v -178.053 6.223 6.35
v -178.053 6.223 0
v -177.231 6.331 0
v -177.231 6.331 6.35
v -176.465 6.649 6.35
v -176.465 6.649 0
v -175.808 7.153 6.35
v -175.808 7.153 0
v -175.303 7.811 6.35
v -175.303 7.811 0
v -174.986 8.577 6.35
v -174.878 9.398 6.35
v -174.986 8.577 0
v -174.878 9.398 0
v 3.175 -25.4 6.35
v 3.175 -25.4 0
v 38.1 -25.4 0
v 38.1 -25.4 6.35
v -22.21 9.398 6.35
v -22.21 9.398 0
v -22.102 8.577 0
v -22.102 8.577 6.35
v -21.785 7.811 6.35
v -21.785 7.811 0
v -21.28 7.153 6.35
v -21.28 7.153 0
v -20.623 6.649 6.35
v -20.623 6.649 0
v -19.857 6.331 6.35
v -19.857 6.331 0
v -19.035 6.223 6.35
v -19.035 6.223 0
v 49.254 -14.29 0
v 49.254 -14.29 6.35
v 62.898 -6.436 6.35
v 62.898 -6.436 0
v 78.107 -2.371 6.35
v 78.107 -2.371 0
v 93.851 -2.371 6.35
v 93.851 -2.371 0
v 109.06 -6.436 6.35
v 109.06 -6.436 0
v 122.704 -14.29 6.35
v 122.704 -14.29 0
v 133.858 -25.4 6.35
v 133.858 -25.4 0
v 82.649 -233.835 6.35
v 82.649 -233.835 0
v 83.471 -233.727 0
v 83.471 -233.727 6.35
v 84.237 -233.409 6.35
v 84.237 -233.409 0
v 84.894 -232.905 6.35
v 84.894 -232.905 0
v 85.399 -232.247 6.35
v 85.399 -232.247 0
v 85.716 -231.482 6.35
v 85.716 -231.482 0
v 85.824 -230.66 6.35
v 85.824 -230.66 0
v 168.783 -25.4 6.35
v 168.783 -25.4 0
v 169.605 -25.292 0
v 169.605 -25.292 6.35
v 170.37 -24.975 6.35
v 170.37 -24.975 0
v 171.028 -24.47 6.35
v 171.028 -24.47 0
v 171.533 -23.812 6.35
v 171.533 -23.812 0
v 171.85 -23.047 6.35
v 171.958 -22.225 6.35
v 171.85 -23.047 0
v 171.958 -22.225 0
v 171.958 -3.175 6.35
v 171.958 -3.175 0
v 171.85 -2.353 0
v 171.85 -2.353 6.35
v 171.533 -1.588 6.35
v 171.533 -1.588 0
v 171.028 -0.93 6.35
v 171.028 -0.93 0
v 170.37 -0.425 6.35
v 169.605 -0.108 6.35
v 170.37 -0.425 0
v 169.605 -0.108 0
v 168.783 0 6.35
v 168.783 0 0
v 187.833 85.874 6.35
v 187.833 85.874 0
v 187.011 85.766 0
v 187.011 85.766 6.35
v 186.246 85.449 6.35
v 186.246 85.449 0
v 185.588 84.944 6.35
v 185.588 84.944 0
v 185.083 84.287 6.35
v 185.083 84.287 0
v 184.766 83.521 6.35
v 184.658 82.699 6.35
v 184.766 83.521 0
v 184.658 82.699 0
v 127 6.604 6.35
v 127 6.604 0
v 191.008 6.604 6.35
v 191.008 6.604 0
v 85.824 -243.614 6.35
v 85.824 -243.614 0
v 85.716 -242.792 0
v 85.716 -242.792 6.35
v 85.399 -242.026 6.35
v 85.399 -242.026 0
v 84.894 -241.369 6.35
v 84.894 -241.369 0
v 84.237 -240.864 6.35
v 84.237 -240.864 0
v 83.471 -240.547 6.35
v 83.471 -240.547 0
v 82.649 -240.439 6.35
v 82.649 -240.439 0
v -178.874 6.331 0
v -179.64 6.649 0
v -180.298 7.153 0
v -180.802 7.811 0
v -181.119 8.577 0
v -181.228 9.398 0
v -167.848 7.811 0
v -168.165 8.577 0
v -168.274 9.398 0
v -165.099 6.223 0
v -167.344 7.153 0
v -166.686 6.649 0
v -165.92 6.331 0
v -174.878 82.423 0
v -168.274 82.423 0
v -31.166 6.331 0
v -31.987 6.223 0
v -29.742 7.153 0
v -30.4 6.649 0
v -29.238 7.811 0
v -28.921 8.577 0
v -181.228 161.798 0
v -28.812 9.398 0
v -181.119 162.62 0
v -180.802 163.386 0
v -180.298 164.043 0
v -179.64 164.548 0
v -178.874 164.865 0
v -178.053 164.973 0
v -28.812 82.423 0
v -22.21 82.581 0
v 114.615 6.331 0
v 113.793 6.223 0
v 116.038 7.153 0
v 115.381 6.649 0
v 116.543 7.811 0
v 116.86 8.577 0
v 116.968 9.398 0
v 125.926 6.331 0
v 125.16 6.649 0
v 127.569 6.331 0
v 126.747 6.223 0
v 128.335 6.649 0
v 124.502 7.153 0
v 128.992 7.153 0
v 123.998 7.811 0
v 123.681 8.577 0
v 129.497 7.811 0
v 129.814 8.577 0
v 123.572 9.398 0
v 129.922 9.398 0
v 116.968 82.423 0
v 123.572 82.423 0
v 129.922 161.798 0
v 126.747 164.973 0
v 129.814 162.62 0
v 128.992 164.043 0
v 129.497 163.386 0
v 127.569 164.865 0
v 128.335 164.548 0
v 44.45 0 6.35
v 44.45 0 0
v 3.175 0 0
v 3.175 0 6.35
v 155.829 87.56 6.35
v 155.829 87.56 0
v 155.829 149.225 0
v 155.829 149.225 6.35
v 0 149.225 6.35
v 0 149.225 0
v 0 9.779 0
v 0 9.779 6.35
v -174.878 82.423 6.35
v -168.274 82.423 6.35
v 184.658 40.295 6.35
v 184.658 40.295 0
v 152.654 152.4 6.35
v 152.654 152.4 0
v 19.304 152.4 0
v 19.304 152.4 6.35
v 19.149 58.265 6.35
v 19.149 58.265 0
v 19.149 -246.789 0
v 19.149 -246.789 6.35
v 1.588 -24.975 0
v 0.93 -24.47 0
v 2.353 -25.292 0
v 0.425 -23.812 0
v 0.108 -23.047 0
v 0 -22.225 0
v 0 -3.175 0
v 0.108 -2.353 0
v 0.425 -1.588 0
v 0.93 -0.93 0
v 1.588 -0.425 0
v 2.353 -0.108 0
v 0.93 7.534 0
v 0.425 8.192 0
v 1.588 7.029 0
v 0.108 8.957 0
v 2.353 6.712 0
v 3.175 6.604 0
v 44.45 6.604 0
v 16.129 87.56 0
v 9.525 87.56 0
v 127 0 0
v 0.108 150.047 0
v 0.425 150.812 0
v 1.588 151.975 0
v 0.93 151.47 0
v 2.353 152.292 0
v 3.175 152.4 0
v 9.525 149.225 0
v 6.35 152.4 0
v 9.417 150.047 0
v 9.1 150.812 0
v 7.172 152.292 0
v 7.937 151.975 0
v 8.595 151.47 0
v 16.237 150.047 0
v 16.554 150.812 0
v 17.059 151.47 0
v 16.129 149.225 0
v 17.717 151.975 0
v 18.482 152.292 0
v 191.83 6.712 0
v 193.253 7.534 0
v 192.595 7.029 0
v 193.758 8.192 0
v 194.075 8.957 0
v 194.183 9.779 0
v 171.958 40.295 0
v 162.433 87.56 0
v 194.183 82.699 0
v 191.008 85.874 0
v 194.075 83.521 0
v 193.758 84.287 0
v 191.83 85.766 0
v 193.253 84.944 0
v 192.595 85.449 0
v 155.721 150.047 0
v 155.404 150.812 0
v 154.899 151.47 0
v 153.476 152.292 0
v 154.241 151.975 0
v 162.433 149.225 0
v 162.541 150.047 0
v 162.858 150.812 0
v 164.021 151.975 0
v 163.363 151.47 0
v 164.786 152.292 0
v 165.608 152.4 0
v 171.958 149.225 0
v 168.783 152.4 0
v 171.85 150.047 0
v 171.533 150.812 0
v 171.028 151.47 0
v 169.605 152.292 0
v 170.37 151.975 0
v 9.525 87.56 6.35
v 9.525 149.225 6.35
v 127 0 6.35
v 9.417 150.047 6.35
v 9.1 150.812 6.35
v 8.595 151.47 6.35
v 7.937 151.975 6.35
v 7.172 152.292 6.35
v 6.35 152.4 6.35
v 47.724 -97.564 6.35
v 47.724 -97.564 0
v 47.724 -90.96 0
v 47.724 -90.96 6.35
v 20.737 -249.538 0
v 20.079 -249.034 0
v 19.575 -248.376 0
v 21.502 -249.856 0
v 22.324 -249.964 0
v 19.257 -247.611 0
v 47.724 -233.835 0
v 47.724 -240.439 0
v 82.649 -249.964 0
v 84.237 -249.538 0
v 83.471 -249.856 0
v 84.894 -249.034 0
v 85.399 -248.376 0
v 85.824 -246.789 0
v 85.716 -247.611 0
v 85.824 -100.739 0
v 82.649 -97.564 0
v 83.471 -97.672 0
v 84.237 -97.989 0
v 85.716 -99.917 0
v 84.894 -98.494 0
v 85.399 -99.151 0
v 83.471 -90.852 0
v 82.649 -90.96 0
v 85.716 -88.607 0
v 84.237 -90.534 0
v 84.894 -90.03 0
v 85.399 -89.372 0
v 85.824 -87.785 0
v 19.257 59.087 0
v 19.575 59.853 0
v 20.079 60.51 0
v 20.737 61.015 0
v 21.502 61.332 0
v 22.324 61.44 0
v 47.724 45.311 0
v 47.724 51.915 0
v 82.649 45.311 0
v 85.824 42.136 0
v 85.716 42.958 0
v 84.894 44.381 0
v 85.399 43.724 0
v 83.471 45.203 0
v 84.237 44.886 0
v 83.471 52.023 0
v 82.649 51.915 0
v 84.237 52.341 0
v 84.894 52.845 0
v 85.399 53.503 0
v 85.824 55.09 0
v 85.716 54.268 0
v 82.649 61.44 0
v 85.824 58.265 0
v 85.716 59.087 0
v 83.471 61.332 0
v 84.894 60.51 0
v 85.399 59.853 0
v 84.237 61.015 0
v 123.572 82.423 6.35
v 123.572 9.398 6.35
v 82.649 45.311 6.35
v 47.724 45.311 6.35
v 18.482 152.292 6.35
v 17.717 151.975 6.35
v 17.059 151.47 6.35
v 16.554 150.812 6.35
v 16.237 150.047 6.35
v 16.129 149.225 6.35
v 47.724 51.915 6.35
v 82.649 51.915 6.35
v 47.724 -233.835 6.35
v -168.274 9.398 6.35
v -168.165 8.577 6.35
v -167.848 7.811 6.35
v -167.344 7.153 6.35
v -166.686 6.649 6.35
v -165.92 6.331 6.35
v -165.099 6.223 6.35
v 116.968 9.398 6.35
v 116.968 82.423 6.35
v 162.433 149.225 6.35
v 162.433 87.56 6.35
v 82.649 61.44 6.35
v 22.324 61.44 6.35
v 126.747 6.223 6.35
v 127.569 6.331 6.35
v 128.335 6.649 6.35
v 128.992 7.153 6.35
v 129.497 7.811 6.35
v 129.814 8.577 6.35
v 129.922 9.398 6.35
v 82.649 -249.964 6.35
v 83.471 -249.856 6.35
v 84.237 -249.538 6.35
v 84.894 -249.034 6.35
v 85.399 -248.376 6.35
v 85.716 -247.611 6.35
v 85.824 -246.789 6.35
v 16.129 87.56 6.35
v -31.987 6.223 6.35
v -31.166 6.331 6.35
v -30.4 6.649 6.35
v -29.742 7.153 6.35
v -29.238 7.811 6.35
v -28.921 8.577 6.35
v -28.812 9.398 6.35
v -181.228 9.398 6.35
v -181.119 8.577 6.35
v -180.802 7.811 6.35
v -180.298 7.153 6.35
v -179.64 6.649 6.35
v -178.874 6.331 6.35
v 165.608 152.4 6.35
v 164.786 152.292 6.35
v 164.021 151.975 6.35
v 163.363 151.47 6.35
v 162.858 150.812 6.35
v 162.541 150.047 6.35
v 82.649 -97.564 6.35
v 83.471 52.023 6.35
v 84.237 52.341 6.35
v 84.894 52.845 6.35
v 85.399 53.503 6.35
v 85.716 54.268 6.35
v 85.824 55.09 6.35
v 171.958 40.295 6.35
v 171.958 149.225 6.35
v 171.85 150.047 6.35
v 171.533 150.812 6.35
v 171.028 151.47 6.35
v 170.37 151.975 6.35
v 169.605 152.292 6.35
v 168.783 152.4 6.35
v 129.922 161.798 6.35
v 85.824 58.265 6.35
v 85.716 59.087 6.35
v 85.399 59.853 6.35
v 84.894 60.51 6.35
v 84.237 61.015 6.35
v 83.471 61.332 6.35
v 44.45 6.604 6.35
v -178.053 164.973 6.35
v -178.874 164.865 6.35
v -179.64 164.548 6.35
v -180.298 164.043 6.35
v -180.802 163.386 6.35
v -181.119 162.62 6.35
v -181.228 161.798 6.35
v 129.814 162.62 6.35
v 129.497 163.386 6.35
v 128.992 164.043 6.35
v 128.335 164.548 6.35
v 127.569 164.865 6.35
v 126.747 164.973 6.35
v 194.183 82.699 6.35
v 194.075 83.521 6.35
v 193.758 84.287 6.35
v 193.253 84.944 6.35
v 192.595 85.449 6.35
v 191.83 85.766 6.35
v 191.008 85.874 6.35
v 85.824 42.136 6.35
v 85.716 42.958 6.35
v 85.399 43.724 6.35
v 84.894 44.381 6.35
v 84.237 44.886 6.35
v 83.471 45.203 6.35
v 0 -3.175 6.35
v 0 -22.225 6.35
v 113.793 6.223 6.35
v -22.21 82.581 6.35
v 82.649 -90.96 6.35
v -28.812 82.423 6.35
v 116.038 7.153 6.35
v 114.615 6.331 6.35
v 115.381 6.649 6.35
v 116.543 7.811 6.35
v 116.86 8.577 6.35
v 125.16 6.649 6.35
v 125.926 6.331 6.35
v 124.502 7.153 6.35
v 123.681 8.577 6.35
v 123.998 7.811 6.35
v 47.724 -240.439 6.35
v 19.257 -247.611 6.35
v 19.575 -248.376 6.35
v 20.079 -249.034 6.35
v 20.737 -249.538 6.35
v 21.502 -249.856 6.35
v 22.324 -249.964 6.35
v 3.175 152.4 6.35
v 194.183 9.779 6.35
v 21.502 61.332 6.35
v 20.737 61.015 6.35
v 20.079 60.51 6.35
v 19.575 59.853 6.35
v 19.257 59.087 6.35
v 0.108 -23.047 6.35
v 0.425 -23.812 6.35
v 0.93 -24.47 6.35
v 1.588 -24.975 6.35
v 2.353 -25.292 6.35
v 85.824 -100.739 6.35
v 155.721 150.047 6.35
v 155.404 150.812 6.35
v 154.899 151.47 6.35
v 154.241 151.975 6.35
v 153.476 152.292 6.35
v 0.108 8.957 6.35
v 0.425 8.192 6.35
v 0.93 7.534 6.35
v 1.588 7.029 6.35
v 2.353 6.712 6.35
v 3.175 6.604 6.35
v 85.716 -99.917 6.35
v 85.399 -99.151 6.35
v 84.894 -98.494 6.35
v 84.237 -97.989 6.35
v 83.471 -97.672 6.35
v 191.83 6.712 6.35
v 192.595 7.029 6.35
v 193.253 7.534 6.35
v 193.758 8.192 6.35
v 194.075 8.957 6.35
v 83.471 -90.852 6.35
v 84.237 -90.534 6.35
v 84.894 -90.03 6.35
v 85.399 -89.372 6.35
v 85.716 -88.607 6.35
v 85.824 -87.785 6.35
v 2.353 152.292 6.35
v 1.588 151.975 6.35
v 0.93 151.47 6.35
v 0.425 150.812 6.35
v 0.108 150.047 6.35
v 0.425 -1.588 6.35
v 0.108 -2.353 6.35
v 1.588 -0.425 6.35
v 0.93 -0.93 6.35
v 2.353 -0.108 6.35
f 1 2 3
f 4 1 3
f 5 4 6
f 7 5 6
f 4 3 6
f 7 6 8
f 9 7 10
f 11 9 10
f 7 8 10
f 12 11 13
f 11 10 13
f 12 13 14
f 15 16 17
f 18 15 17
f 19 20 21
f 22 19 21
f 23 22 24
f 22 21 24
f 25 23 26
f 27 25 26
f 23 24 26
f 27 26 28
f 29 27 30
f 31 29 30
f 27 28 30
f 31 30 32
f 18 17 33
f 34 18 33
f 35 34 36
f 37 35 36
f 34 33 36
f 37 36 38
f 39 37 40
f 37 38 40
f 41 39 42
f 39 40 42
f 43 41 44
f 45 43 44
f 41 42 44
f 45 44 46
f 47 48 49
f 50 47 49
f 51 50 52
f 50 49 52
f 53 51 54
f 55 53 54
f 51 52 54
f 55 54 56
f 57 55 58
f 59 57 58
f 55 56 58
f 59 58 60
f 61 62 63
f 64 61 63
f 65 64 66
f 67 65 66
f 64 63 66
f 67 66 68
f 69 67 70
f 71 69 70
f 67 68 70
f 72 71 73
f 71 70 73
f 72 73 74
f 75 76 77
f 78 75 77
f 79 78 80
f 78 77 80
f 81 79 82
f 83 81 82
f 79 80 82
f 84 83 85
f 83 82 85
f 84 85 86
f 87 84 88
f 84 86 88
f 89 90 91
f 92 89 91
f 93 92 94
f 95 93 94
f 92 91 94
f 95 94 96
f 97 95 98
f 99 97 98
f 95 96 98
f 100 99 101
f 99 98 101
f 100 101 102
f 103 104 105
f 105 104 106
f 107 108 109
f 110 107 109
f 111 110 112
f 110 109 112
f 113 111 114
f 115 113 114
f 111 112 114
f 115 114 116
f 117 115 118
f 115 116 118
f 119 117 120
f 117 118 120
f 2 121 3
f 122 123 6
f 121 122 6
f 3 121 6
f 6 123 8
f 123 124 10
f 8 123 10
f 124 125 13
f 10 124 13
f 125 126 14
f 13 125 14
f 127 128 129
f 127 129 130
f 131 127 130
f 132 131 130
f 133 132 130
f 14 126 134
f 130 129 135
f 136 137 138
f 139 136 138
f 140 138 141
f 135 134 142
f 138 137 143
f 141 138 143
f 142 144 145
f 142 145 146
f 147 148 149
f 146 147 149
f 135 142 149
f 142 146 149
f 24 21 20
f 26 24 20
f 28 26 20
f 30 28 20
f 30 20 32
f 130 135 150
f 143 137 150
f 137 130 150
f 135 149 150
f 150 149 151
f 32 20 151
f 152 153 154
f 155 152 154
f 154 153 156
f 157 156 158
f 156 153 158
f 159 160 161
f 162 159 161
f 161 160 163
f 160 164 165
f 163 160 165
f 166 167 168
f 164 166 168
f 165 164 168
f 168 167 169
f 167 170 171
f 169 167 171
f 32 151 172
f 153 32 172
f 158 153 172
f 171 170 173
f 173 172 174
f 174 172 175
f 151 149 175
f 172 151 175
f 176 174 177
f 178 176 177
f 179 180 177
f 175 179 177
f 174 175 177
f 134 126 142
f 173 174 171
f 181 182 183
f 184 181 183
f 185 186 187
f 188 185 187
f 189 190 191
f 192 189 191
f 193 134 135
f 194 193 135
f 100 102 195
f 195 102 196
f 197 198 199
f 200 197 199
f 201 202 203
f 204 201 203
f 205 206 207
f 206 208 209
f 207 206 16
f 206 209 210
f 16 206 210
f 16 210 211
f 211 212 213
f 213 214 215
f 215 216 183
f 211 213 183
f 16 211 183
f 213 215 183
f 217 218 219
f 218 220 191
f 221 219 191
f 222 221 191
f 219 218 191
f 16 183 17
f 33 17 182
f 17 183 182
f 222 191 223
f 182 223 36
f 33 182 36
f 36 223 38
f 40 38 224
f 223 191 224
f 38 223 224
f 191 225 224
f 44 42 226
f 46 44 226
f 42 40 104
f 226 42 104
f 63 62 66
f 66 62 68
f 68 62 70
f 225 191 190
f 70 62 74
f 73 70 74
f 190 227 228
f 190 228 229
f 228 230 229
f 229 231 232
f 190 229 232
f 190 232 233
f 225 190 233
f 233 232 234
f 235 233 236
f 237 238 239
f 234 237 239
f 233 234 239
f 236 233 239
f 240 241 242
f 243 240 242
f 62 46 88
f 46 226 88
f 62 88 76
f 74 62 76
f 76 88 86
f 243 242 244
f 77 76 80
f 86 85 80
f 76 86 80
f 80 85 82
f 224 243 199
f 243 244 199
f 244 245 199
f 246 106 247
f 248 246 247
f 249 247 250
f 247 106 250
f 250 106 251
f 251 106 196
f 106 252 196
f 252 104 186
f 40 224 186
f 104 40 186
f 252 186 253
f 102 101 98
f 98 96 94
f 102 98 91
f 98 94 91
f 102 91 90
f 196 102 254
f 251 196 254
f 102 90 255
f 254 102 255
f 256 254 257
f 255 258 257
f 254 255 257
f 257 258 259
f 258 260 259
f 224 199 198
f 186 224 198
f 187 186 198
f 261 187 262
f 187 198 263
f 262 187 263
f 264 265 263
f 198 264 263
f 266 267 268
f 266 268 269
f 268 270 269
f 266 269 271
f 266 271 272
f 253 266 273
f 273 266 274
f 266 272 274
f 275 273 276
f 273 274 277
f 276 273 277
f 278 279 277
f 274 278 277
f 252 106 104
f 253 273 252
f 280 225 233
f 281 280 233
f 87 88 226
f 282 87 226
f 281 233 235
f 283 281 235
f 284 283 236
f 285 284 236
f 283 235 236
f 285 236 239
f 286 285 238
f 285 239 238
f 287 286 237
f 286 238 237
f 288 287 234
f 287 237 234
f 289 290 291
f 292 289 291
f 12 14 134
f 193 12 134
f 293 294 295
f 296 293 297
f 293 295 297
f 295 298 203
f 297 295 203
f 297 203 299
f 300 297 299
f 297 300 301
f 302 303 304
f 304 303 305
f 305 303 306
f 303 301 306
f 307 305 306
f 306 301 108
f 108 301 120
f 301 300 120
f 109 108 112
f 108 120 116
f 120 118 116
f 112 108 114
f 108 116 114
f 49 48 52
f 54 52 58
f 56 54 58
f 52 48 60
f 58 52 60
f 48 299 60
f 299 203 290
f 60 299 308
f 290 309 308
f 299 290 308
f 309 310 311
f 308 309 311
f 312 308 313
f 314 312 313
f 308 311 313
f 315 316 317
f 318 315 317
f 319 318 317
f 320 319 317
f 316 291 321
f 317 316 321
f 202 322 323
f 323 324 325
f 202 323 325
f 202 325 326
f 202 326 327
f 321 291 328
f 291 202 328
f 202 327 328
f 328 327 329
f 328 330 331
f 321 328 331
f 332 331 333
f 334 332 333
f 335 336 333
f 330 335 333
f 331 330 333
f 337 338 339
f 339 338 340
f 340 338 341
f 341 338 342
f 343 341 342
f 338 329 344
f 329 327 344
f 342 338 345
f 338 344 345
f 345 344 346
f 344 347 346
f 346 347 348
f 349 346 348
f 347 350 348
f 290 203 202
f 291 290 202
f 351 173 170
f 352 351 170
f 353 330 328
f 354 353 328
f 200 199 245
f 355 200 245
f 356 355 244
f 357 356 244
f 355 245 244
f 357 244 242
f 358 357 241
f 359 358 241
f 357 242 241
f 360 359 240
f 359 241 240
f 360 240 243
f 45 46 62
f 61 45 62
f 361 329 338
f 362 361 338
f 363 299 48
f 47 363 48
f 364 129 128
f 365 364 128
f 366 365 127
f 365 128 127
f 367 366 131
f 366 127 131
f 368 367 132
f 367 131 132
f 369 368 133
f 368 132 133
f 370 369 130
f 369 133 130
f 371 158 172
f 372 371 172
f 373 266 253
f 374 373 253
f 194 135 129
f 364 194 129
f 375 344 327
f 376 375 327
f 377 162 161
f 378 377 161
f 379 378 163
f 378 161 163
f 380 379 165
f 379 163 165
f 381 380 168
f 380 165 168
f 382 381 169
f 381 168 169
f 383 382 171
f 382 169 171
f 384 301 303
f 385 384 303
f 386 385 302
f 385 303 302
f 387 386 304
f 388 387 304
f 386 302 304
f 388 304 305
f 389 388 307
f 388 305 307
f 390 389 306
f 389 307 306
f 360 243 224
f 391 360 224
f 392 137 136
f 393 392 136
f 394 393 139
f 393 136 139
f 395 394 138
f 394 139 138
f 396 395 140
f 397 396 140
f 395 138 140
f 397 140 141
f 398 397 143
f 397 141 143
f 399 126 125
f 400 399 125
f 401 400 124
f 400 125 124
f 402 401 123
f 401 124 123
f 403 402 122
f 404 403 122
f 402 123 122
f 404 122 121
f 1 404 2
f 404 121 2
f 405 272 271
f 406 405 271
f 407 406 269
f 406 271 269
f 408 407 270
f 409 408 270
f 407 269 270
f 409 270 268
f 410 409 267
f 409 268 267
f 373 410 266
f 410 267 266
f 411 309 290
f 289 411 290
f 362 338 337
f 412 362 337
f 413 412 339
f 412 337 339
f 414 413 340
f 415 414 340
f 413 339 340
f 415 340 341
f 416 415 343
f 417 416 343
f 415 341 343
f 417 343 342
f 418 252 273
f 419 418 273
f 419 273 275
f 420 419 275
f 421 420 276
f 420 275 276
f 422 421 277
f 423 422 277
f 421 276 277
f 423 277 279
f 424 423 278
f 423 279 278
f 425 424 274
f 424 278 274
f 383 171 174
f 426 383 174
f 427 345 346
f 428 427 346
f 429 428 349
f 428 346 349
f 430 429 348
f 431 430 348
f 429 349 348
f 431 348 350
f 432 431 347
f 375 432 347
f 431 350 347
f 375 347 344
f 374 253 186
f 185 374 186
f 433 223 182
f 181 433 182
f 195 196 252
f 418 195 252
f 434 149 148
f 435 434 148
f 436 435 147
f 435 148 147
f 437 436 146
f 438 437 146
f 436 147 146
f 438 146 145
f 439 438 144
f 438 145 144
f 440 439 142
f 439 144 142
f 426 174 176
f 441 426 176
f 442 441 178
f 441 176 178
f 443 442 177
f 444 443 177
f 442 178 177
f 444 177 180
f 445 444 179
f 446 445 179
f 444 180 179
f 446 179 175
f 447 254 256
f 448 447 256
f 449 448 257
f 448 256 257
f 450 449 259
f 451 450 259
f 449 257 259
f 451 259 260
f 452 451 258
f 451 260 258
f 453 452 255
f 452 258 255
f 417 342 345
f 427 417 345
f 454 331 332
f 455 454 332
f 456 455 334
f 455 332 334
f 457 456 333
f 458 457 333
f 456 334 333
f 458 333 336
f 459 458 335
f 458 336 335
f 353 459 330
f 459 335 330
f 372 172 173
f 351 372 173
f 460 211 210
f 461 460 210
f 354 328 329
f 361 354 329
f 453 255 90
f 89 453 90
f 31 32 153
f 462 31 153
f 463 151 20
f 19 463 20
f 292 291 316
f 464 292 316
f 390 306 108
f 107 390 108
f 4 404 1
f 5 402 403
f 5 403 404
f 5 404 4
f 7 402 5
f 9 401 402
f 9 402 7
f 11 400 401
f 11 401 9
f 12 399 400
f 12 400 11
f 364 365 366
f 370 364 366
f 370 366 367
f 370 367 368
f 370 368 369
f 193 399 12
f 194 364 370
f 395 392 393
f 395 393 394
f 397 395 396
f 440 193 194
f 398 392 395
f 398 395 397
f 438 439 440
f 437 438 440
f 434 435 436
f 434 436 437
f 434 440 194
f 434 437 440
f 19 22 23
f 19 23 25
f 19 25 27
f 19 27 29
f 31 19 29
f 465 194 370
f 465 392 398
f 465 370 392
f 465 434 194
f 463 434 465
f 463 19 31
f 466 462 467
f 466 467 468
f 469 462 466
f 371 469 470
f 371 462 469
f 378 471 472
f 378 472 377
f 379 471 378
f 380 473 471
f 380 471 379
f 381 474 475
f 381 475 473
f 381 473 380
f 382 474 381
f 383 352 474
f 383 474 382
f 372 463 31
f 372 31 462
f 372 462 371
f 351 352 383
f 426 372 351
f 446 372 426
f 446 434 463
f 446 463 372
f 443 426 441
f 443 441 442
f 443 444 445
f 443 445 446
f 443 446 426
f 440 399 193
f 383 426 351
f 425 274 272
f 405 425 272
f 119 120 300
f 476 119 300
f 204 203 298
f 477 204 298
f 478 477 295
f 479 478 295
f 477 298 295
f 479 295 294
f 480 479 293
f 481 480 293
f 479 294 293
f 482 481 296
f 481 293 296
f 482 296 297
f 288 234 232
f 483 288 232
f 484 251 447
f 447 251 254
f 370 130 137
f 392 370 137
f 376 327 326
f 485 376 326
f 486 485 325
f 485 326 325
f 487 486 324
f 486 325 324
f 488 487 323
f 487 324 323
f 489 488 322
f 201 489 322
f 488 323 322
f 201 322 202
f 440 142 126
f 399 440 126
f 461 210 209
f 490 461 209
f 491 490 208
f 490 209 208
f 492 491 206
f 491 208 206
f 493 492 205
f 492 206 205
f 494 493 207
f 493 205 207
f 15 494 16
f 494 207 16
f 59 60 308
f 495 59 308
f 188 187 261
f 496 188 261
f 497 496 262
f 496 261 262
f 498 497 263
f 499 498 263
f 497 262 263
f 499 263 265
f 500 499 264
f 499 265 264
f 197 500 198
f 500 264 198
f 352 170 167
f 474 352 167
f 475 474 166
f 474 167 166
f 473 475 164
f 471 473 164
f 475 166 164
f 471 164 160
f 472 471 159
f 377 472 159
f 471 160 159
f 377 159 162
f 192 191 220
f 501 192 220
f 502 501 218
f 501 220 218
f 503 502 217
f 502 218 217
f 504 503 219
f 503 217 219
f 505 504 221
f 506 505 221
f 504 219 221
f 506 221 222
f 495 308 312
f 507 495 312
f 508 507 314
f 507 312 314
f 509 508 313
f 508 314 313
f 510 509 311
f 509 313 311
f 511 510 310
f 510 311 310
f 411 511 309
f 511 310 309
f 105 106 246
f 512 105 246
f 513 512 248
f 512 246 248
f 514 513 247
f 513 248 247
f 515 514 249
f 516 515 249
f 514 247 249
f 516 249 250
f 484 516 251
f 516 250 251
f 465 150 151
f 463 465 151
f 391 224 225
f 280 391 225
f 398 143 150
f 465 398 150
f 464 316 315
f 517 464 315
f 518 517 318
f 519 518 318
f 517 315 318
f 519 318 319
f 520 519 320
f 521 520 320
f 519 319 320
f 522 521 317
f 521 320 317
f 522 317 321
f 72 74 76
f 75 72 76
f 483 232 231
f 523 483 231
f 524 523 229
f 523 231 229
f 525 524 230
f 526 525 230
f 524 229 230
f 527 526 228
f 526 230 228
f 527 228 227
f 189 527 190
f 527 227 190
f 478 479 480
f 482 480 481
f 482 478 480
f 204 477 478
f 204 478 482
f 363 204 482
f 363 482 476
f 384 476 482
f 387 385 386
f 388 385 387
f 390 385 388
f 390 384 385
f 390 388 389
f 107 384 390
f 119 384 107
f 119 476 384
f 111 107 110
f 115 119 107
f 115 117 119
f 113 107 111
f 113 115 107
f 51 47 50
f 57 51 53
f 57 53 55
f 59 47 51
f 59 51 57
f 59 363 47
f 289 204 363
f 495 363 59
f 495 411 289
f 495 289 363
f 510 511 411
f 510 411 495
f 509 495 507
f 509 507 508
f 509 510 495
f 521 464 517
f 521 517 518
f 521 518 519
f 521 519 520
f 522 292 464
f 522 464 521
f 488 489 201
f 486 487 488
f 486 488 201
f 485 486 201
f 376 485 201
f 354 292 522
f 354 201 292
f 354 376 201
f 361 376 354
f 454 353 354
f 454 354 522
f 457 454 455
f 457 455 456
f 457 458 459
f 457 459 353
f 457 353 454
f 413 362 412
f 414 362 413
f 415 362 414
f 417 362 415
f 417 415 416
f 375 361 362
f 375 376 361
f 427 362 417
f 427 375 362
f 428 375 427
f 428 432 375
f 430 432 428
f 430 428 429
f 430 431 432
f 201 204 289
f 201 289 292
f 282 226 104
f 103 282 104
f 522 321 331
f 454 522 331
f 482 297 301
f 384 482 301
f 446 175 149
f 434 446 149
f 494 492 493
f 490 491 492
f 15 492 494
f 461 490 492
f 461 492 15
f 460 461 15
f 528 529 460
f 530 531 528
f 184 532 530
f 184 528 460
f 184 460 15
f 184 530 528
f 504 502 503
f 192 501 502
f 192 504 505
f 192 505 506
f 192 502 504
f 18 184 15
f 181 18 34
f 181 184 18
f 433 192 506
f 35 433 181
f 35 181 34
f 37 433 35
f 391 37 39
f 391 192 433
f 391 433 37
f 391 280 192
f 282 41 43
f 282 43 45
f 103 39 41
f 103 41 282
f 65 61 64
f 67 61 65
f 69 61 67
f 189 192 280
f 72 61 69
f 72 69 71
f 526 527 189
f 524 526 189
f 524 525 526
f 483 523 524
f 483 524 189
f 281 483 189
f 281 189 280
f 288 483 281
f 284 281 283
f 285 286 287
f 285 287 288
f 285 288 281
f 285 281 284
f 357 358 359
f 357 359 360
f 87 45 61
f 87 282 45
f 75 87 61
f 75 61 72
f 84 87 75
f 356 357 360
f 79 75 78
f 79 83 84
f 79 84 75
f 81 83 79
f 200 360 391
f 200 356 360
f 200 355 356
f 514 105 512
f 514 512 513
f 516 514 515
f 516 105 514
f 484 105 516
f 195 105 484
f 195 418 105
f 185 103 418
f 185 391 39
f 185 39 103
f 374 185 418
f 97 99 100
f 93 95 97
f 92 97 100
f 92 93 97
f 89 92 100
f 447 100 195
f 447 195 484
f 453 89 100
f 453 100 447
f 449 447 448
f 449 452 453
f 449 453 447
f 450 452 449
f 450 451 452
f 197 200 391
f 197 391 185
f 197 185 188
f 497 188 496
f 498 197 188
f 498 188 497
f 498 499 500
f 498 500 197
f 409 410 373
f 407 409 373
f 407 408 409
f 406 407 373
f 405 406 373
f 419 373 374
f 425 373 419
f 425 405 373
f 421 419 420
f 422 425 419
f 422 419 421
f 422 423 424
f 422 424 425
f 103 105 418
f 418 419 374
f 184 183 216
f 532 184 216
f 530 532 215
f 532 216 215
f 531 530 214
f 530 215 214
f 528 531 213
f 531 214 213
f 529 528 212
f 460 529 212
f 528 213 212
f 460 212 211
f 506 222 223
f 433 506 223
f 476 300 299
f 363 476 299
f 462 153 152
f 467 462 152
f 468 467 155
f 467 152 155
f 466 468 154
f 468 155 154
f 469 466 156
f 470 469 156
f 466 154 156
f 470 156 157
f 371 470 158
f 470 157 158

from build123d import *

# Parameters (mm, degrees)
F3_DEPTH = 6.35
F4_DEPTH = 6.35
F5_DEPTH = 6.35
F6_DEPTH = 6.35


with BuildPart() as f3:
    # F1 (on Top) → F3 (new body)
    with BuildSketch(Plane.XY):
        with BuildLine():
            Line((82.649146, 61.440174), (22.324146, 61.440174))
            ThreePointArc((22.324146, 61.440174), (20.079082, 60.510238), (19.149146, 58.265174))
            Line((19.149146, 58.265174), (19.149146, -246.788826))
            ThreePointArc((19.149146, -246.788826), (20.079082, -249.03389), (22.324146, -249.963826))
            Line((22.324146, -249.963826), (82.649146, -249.963826))
            ThreePointArc((82.649146, -249.963826), (84.89421, -249.03389), (85.824146, -246.788826))
            Line((85.824146, -246.788826), (85.824146, -243.613826))
            ThreePointArc((85.824146, -243.613826), (84.89421, -241.368762), (82.649146, -240.438826))
            Line((82.649146, -240.438826), (47.724146, -240.438826))
            Line((47.724146, -240.438826), (47.724146, -233.834826))
            Line((47.724146, -233.834826), (82.649146, -233.834826))
            ThreePointArc((82.649146, -233.834826), (84.89421, -232.90489), (85.824146, -230.659826))
            Line((85.824146, -230.659826), (85.824146, -100.738826))
            ThreePointArc((85.824146, -100.738826), (84.89421, -98.493762), (82.649146, -97.563826))
            Line((82.649146, -97.563826), (47.724146, -97.563826))
            Line((47.724146, -97.563826), (47.724146, -90.959826))
            Line((47.724146, -90.959826), (82.649146, -90.959826))
            ThreePointArc((82.649146, -90.959826), (84.89421, -90.02989), (85.824146, -87.784826))
            Line((85.824146, -87.784826), (85.824146, 42.136174))
            ThreePointArc((85.824146, 42.136174), (84.89421, 44.381238), (82.649146, 45.311174))
            Line((82.649146, 45.311174), (47.724146, 45.311174))
            Line((47.724146, 45.311174), (47.724146, 51.915174))
            Line((47.724146, 51.915174), (82.649146, 51.915174))
            ThreePointArc((82.649146, 51.915174), (84.89421, 52.84511), (85.824146, 55.090174))
            Line((85.824146, 55.090174), (85.824146, 58.265174))
            ThreePointArc((85.824146, 58.265174), (84.89421, 60.510238), (82.649146, 61.440174))
        make_face()
    extrude(amount=F3_DEPTH)

    # F1 (on Top) → F4 (join)
    with BuildSketch(Plane.XY):
        with BuildLine():
            Line((82.649146, 61.440174), (22.324146, 61.440174))
            ThreePointArc((22.324146, 61.440174), (20.079082, 60.510238), (19.149146, 58.265174))
            Line((19.149146, 58.265174), (19.149146, -246.788826))
            ThreePointArc((19.149146, -246.788826), (20.079082, -249.03389), (22.324146, -249.963826))
            Line((22.324146, -249.963826), (82.649146, -249.963826))
            ThreePointArc((82.649146, -249.963826), (84.89421, -249.03389), (85.824146, -246.788826))
            Line((85.824146, -246.788826), (85.824146, -243.613826))
            ThreePointArc((85.824146, -243.613826), (84.89421, -241.368762), (82.649146, -240.438826))
            Line((82.649146, -240.438826), (47.724146, -240.438826))
            Line((47.724146, -240.438826), (47.724146, -233.834826))
            Line((47.724146, -233.834826), (82.649146, -233.834826))
            ThreePointArc((82.649146, -233.834826), (84.89421, -232.90489), (85.824146, -230.659826))
            Line((85.824146, -230.659826), (85.824146, -100.738826))
            ThreePointArc((85.824146, -100.738826), (84.89421, -98.493762), (82.649146, -97.563826))
            Line((82.649146, -97.563826), (47.724146, -97.563826))
            Line((47.724146, -97.563826), (47.724146, -90.959826))
            Line((47.724146, -90.959826), (82.649146, -90.959826))
            ThreePointArc((82.649146, -90.959826), (84.89421, -90.02989), (85.824146, -87.784826))
            Line((85.824146, -87.784826), (85.824146, 42.136174))
            ThreePointArc((85.824146, 42.136174), (84.89421, 44.381238), (82.649146, 45.311174))
            Line((82.649146, 45.311174), (47.724146, 45.311174))
            Line((47.724146, 45.311174), (47.724146, 51.915174))
            Line((47.724146, 51.915174), (82.649146, 51.915174))
            ThreePointArc((82.649146, 51.915174), (84.89421, 52.84511), (85.824146, 55.090174))
            Line((85.824146, 55.090174), (85.824146, 58.265174))
            ThreePointArc((85.824146, 58.265174), (84.89421, 60.510238), (82.649146, 61.440174))
        make_face()
    extrude(amount=F4_DEPTH)


with BuildPart() as f5:
    # F2 (on Top) → F5 (new body)
    with BuildSketch(Plane.XY):
        with BuildLine():
            ThreePointArc((129.922354, 161.798257), (128.992418, 164.043321), (126.747354, 164.973257))
            Line((126.747354, 164.973257), (-178.052646, 164.973257))
            ThreePointArc((-178.052646, 164.973257), (-180.29771, 164.043321), (-181.227646, 161.798257))
            Line((-181.227646, 161.798257), (-181.227646, 9.398257))
            ThreePointArc((-181.227646, 9.398257), (-180.29771, 7.153193), (-178.052646, 6.223257))
            ThreePointArc((-178.052646, 6.223257), (-175.807582, 7.153193), (-174.877646, 9.398257))
            Line((-174.877646, 9.398257), (-174.877646, 82.423257))
            Line((-174.877646, 82.423257), (-168.273646, 82.423257))
            Line((-168.273646, 82.423257), (-168.273646, 9.398257))
            ThreePointArc((-168.273646, 9.398257), (-167.34371, 7.153193), (-165.098646, 6.223257))
            Line((-165.098646, 6.223257), (-31.987469, 6.223257))
            ThreePointArc((-31.987469, 6.223257), (-29.742405, 7.153193), (-28.812469, 9.398257))
            Line((-28.812469, 9.398257), (-28.812469, 82.423257))
            Line((-28.812469, 82.423257), (-22.210363, 82.581408))
            Line((-22.210363, 82.581408), (-22.210363, 9.398257))
            ThreePointArc((-22.210363, 9.398257), (-21.280427, 7.153193), (-19.035363, 6.223257))
            Line((-19.035363, 6.223257), (113.793354, 6.223257))
            ThreePointArc((113.793354, 6.223257), (116.038418, 7.153193), (116.968354, 9.398257))
            Line((116.968354, 9.398257), (116.968354, 82.423257))
            Line((116.968354, 82.423257), (123.572354, 82.423257))
            Line((123.572354, 82.423257), (123.572354, 9.398257))
            ThreePointArc((123.572354, 9.398257), (124.50229, 7.153193), (126.747354, 6.223257))
            ThreePointArc((126.747354, 6.223257), (128.992418, 7.153193), (129.922354, 9.398257))
            Line((129.922354, 9.398257), (129.922354, 161.798257))
        make_face()
    extrude(amount=F5_DEPTH)


with BuildPart() as f6:
    # F0 (on Top) → F6 (new body)
    with BuildSketch(Plane.XY):
        with BuildLine():
            Line((0, 149.225), (0, 9.779))
            ThreePointArc((0, 9.779), (0.929936, 7.533936), (3.175, 6.604))
            Line((3.175, 6.604), (44.45, 6.604))
            Line((44.45, 6.604), (44.45, 0))
            Line((44.45, 0), (3.175, 0))
            ThreePointArc((3.175, 0), (0.929936, -0.929936), (0, -3.175))
            Line((0, -3.175), (0, -22.225))
            ThreePointArc((0, -22.225), (0.929936, -24.470064), (3.175, -25.4))
            Line((3.175, -25.4), (38.1, -25.4))
            ThreePointArc((38.1, -25.4), (85.979, -1.856854), (133.858, -25.4))
            Line((133.858, -25.4), (168.783, -25.4))
            ThreePointArc((168.783, -25.4), (171.028064, -24.470064), (171.958, -22.225))
            Line((171.958, -22.225), (171.958, -3.175))
            ThreePointArc((171.958, -3.175), (171.028064, -0.929936), (168.783, 0))
            Line((168.783, 0), (127, 0))
            Line((127, 0), (127, 6.604))
            Line((127, 6.604), (171.958, 6.604))
            Line((171.958, 6.604), (191.008, 6.604))
            ThreePointArc((191.008, 6.604), (193.253064, 7.533936), (194.183, 9.779))
            Line((194.183, 9.779), (194.183, 82.69941))
            ThreePointArc((194.183, 82.69941), (193.253064, 84.944474), (191.008, 85.87441))
            Line((191.008, 85.87441), (187.833, 85.87441))
            ThreePointArc((187.833, 85.87441), (185.587936, 84.944474), (184.658, 82.69941))
            Line((184.658, 82.69941), (184.658, 40.294755))
            Line((184.658, 40.294755), (171.958, 40.294755))
            Line((171.958, 40.294755), (171.958, 149.225))
            ThreePointArc((171.958, 149.225), (171.028064, 151.470064), (168.783, 152.4))
            Line((168.783, 152.4), (165.608, 152.4))
            ThreePointArc((165.608, 152.4), (163.362936, 151.470064), (162.433, 149.225))
            Line((162.433, 149.225), (162.433, 87.559589))
            Line((162.433, 87.559589), (155.829, 87.559589))
            Line((155.829, 87.559589), (155.829, 149.225))
            ThreePointArc((155.829, 149.225), (154.899064, 151.470064), (152.654, 152.4))
            Line((152.654, 152.4), (19.304, 152.4))
            ThreePointArc((19.304, 152.4), (17.058936, 151.470064), (16.129, 149.225))
            Line((16.129, 149.225), (16.129, 87.559589))
            Line((16.129, 87.559589), (9.525, 87.559589))
            Line((9.525, 87.559589), (9.525, 149.225))
            ThreePointArc((9.525, 149.225), (8.595064, 151.470064), (6.35, 152.4))
            Line((6.35, 152.4), (3.175, 152.4))
            ThreePointArc((3.175, 152.4), (0.929936, 151.470064), (0, 149.225))
        make_face()
    extrude(amount=F6_DEPTH)


solid = Compound([f3.part, f5.part, f6.part])
